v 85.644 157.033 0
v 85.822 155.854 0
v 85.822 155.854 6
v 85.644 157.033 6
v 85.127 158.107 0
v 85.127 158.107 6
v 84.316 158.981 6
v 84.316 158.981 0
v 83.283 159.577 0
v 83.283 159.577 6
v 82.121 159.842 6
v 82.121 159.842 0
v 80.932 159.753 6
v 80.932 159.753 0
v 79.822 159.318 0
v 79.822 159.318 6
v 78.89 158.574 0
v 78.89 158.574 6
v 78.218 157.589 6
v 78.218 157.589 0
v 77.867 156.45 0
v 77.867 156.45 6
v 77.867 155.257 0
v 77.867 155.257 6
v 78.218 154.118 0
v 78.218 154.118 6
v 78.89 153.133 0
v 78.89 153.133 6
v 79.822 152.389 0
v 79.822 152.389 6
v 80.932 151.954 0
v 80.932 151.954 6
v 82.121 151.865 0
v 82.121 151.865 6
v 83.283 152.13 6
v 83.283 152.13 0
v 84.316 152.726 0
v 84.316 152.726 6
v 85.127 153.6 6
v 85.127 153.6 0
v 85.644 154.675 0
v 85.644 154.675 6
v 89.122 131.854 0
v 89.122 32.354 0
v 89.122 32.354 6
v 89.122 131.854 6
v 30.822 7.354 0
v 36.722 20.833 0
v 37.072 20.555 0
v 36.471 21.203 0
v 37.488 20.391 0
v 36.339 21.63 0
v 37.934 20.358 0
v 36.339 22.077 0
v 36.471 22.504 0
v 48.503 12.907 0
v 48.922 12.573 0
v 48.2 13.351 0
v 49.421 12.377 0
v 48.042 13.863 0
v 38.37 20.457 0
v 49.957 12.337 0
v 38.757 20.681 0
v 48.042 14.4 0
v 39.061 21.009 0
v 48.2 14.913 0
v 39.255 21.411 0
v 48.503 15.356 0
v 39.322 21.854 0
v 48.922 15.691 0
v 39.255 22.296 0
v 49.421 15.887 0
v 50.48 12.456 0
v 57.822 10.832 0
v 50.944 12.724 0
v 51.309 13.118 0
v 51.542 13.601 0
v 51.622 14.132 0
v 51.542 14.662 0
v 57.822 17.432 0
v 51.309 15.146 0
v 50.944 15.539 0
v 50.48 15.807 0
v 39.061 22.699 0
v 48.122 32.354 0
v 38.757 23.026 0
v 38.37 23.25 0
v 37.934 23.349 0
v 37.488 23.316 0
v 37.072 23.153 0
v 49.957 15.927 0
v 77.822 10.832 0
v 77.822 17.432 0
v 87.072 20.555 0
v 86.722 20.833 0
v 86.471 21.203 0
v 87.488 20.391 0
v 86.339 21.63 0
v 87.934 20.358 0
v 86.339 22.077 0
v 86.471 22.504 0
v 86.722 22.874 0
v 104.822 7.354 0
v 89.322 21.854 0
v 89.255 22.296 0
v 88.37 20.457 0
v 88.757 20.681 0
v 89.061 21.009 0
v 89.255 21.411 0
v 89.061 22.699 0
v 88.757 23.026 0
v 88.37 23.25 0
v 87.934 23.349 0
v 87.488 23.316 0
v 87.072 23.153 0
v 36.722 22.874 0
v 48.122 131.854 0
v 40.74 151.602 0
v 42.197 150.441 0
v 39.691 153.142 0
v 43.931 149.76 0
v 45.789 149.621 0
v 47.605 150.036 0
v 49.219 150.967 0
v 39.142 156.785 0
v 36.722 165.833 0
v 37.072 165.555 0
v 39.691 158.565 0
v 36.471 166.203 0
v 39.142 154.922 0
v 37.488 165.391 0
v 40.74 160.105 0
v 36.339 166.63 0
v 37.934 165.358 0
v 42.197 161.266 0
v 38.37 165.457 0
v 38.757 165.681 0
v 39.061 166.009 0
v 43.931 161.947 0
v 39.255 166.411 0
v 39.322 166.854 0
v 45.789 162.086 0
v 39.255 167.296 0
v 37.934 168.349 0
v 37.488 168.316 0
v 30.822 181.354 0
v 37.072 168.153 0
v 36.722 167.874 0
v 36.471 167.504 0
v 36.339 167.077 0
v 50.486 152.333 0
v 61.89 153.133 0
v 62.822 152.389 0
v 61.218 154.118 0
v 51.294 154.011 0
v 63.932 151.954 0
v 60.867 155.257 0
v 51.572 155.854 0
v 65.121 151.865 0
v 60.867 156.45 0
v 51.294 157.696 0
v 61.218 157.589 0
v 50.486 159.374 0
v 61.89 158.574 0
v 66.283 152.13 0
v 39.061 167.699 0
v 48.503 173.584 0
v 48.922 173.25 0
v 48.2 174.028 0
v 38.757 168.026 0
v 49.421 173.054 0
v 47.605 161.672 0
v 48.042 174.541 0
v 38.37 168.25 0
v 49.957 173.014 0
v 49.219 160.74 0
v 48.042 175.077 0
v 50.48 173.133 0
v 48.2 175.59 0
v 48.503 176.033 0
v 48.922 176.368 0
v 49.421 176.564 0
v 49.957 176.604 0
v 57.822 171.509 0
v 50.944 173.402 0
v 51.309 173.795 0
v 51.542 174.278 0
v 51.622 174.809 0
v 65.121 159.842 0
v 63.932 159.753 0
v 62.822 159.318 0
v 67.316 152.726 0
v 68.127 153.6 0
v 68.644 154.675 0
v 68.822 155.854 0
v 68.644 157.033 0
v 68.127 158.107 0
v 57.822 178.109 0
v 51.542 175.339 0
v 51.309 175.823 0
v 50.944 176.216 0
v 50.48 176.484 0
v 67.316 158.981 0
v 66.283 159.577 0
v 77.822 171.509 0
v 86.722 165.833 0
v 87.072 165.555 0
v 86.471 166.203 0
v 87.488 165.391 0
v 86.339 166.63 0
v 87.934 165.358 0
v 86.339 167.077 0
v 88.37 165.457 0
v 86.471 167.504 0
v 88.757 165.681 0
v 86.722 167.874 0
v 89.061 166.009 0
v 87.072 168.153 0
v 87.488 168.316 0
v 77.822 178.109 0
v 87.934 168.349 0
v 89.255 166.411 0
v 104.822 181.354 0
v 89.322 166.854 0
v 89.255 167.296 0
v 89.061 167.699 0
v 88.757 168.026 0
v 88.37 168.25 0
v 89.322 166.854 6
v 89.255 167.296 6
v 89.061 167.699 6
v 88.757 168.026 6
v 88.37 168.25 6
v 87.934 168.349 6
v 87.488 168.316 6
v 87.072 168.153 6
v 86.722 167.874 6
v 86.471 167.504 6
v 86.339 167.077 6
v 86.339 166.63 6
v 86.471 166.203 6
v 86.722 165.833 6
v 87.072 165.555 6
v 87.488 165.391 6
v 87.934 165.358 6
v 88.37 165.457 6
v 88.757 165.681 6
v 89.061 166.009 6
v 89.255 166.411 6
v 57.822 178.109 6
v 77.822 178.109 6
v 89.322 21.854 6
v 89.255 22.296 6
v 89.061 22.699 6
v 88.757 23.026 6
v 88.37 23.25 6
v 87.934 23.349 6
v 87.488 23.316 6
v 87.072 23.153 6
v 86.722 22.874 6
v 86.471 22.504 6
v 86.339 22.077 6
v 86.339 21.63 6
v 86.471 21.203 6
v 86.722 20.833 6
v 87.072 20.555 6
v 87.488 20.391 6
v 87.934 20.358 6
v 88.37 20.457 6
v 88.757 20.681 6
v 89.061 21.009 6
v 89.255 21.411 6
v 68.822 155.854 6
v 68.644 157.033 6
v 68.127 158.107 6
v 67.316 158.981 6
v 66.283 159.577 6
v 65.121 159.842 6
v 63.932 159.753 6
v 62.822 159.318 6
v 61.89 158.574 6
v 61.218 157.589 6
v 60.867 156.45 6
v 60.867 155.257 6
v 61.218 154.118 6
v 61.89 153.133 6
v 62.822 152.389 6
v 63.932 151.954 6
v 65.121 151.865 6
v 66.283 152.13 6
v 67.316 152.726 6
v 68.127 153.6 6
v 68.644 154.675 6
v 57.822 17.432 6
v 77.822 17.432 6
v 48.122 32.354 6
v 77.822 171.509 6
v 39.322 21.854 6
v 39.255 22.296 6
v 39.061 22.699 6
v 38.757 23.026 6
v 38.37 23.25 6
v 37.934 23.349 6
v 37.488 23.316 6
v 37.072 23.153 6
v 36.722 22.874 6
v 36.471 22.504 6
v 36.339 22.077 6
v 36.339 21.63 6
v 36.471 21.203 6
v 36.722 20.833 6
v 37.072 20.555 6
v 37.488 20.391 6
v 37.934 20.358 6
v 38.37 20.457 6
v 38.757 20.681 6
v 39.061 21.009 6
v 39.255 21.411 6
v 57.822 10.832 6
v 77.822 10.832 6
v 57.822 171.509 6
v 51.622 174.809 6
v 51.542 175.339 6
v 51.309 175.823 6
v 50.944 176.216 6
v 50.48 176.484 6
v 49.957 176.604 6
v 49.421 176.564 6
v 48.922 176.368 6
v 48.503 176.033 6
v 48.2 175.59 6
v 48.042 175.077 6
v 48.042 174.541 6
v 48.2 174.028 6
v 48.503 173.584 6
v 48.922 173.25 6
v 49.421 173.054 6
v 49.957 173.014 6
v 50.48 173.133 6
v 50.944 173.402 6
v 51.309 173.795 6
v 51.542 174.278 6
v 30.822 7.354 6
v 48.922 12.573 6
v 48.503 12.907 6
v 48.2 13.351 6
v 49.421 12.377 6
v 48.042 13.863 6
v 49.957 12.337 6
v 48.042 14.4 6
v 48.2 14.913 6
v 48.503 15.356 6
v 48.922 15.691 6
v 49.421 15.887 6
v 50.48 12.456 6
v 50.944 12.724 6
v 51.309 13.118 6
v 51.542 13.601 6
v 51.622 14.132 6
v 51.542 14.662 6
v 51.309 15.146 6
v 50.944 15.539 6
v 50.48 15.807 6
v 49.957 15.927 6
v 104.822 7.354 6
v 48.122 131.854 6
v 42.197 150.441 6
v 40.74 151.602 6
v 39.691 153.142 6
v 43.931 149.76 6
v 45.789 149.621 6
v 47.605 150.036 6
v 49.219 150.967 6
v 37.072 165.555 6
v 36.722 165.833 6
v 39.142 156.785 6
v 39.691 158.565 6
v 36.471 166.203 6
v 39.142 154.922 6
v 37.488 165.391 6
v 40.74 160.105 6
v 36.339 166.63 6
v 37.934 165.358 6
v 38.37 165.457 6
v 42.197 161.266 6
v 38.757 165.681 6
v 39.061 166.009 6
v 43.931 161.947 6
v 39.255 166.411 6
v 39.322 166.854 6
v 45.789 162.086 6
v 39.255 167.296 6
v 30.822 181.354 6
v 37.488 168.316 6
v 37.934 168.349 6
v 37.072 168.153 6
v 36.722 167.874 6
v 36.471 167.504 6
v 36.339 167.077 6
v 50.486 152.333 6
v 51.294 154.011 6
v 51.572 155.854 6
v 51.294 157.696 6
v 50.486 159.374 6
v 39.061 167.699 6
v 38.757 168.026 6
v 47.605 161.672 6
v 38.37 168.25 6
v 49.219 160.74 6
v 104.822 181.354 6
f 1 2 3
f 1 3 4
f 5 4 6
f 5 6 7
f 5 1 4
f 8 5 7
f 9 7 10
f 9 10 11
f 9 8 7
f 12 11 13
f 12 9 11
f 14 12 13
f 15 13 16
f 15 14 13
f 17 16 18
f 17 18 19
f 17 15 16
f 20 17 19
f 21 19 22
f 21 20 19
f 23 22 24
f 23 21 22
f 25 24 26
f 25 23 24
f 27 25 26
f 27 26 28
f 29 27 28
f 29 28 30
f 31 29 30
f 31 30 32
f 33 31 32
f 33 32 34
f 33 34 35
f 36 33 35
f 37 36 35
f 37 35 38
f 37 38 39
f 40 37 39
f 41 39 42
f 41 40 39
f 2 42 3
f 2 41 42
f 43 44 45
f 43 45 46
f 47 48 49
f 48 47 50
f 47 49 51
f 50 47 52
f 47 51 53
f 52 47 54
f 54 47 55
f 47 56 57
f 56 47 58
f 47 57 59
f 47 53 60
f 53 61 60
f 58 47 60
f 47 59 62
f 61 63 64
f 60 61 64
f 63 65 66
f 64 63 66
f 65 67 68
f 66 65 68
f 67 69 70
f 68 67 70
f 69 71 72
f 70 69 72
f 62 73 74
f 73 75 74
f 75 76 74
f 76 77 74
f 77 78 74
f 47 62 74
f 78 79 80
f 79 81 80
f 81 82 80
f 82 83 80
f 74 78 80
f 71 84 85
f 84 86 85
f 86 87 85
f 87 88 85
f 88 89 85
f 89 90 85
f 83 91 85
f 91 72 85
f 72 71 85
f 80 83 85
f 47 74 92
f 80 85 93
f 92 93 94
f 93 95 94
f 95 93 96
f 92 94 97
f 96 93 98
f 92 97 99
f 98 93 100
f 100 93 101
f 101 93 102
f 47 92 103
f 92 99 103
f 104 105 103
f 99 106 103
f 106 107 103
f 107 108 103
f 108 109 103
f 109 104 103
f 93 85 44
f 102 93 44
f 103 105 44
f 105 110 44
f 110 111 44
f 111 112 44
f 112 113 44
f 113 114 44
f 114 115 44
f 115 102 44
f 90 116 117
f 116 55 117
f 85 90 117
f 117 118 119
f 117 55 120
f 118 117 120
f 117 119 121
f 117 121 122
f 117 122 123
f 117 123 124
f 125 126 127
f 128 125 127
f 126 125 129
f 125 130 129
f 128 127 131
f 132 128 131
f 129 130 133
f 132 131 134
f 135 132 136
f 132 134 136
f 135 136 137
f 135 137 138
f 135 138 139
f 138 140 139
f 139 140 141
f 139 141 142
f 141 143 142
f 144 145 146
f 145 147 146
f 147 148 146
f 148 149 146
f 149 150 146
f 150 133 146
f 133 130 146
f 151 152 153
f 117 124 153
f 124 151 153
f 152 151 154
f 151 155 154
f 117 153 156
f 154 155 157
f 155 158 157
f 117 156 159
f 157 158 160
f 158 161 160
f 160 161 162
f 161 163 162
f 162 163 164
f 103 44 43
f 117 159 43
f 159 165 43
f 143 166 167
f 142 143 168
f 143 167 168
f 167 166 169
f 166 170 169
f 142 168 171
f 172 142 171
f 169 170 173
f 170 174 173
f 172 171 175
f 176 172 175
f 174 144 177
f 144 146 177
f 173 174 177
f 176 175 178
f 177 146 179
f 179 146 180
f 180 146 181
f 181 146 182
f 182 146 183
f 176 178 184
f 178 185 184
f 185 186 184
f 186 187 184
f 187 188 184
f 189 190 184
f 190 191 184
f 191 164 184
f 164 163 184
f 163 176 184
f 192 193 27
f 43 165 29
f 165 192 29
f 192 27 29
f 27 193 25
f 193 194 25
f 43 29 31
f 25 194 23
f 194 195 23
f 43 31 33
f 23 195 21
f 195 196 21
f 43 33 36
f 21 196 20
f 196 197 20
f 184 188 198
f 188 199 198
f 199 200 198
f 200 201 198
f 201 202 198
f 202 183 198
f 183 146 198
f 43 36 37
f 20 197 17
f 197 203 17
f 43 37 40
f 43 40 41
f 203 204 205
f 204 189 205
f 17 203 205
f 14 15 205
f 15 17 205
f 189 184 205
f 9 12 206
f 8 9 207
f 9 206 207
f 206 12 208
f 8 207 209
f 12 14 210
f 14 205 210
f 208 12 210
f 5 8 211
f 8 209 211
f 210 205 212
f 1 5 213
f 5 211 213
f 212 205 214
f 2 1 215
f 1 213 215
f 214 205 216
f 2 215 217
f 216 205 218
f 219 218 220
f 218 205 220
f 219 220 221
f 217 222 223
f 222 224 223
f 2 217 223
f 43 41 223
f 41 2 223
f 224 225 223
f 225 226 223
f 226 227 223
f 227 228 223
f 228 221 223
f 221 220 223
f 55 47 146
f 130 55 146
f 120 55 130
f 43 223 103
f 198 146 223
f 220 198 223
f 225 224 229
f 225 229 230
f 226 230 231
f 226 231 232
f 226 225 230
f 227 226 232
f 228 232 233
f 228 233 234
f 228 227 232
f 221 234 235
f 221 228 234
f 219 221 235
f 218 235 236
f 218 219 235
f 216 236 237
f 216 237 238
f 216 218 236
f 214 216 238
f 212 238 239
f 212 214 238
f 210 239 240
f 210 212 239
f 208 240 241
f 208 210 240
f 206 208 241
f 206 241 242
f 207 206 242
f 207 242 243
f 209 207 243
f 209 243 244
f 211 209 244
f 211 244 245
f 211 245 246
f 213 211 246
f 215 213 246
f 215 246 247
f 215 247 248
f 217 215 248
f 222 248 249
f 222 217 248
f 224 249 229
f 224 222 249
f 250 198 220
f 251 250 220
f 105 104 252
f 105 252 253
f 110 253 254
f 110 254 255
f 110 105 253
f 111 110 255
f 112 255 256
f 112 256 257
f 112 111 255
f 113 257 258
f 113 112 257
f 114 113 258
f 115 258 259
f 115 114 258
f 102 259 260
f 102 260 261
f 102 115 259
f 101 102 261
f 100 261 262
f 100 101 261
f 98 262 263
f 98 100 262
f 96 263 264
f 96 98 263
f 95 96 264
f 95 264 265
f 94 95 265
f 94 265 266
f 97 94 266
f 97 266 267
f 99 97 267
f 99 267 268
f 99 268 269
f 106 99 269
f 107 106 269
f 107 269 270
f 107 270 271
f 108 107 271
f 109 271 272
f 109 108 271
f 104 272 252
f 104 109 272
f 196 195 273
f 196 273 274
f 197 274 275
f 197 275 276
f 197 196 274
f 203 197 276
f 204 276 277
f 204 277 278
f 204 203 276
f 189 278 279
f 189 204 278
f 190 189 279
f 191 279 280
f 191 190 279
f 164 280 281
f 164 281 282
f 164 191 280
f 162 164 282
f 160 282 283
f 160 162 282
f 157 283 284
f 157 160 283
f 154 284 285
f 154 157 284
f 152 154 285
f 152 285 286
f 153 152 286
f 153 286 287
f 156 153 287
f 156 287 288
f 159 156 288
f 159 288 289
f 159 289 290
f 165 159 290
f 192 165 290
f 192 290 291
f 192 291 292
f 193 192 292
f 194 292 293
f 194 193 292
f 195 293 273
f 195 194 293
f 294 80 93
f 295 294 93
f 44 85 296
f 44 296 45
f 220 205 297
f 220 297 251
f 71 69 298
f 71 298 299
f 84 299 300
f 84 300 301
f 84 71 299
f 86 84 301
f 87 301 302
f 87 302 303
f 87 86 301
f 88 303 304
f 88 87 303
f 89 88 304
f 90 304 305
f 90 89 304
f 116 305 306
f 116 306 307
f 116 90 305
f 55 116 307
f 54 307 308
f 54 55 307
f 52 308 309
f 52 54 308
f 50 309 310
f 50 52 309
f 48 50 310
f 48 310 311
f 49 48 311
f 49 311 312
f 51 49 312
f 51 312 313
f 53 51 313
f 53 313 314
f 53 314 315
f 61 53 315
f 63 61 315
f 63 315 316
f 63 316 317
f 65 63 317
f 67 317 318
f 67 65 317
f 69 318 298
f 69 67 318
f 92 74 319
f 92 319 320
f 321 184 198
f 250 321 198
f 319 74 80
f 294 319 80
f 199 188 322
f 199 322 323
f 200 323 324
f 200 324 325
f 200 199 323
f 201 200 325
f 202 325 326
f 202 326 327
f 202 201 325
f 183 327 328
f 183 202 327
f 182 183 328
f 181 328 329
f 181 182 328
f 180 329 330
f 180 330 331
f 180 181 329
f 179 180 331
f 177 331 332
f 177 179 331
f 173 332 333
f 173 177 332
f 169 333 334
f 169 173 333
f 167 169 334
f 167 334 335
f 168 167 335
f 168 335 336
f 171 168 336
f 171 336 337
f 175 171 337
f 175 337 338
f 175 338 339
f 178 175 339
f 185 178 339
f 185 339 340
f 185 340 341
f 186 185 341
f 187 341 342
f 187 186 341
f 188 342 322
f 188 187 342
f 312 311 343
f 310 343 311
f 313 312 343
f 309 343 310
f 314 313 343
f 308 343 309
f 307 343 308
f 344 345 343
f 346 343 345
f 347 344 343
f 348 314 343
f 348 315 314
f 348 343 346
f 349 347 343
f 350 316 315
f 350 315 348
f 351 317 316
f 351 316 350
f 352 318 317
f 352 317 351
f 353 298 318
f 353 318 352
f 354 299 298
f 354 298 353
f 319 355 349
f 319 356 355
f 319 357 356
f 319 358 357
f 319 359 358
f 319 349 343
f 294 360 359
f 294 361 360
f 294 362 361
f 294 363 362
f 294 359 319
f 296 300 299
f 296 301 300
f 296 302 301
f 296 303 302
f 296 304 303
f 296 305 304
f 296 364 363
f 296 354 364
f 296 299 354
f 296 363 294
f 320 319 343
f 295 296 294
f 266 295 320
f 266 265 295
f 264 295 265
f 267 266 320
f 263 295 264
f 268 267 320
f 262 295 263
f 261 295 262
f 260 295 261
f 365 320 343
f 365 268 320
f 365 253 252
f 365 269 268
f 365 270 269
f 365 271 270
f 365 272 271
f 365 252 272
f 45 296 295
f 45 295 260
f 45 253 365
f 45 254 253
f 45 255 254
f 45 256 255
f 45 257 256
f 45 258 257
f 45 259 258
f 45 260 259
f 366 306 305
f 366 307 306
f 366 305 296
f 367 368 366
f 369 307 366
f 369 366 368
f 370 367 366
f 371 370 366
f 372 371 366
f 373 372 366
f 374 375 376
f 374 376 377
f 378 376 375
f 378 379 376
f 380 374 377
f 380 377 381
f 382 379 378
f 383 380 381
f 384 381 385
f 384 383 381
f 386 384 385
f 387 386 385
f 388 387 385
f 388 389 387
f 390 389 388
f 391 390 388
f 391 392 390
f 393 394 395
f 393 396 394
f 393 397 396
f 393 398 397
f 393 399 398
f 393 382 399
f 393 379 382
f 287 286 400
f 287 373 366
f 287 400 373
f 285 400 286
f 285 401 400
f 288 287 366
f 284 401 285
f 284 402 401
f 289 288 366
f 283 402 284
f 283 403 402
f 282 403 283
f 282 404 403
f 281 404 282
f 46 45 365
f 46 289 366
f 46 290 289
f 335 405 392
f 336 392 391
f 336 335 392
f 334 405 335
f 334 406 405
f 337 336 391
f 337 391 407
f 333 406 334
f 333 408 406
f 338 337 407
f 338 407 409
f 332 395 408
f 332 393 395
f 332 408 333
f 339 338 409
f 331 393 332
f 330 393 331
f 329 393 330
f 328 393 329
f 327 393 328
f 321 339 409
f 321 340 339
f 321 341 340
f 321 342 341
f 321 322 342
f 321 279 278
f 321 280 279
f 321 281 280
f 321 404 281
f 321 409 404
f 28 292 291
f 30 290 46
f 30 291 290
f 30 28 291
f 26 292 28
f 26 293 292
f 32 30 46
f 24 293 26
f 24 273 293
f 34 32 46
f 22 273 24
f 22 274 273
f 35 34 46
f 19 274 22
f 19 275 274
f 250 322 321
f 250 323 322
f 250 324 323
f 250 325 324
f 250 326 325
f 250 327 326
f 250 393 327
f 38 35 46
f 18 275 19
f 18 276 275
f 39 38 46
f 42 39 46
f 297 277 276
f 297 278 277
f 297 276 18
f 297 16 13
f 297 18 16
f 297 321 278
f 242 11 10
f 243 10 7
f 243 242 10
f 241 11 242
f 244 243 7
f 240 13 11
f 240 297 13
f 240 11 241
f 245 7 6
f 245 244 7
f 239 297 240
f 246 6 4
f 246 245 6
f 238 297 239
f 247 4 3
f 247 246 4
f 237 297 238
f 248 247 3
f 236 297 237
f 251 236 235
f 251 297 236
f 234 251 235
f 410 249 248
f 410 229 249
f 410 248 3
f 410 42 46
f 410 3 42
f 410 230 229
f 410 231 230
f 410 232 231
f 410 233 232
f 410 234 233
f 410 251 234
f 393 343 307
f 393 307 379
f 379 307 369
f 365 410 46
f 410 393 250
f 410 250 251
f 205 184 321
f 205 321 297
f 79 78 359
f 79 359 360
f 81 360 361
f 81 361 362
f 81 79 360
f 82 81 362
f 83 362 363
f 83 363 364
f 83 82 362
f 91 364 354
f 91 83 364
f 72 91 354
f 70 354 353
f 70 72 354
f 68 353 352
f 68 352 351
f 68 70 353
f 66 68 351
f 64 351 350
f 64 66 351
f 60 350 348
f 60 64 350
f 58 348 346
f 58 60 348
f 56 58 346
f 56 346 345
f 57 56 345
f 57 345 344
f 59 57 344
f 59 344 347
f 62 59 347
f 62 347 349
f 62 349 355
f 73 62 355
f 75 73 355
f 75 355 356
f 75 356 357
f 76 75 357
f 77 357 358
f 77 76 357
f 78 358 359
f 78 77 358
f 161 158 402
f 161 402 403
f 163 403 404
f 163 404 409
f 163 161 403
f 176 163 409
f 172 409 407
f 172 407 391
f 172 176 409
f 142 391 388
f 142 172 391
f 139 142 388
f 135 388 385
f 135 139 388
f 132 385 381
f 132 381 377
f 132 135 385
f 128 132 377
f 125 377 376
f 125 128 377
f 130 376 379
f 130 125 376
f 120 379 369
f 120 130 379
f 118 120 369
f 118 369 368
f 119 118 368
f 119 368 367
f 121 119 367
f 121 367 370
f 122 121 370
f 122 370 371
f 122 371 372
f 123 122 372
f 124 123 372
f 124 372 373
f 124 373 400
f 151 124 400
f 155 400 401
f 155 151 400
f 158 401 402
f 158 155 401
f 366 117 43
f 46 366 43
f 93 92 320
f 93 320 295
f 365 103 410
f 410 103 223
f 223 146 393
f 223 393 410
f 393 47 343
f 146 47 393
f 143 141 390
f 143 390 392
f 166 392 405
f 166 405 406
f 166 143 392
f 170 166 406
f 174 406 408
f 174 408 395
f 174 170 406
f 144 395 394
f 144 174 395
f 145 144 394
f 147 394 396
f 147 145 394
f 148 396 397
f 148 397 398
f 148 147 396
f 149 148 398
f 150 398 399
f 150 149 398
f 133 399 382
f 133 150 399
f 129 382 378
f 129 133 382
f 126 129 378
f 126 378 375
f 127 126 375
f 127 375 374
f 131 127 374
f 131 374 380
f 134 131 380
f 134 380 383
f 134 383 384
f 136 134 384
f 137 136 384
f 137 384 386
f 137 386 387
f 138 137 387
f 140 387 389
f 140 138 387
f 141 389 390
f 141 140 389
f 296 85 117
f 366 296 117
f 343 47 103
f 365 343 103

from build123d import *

# Parameters (mm, degrees)
MODEL_W                  = 73.99999408
MODEL_H                  = 173.99998608
MODEL_R                  = 1.5
MODEL_R_2                = 1.799999856
MODEL_R_3                = 1.49999988
MODEL_R_4                = 3.99999968
MODEL_R_5                = 6.2499995
MODEL_W_2                = 40.99999672
MODEL_H_2                = 99.49999204
MODEL_W_3                = 19.999994237
MODEL_H_3                = 6.600001389
RESSALTO_EXTRUS_O1_DEPTH = 6


with BuildPart() as part:
    # Model → Ressalto-extrusão1 (new body)
    with BuildSketch(Plane.XY):
        with Locations((67.822014365, 94.353551358)):
            Rectangle(MODEL_W, MODEL_H)
        with Locations((87.822012765, 21.853557158)):
            Circle(MODEL_R, mode=Mode.SUBTRACT)
        with Locations((49.822015805, 14.131755092)):
            Circle(MODEL_R_2, mode=Mode.SUBTRACT)
        with Locations((37.822016765, 21.853557158)):
            Circle(MODEL_R_3, mode=Mode.SUBTRACT)
        with Locations((87.822012765, 166.853545558)):
            Circle(MODEL_R_3, mode=Mode.SUBTRACT)
        with Locations((81.822013245, 155.853546358)):
            Circle(MODEL_R_4, mode=Mode.SUBTRACT)
        with Locations((64.822014605, 155.853546358)):
            Circle(MODEL_R_4, mode=Mode.SUBTRACT)
        with Locations((45.322016165, 155.853546358)):
            Circle(MODEL_R_5, mode=Mode.SUBTRACT)
        with Locations((37.822016765, 166.853545558)):
            Circle(MODEL_R_3, mode=Mode.SUBTRACT)
        with Locations((49.822015805, 174.808809717)):
            Circle(MODEL_R_2, mode=Mode.SUBTRACT)
        with Locations((68.622014301, 82.103552338)):
            Rectangle(MODEL_W_2, MODEL_H_2, mode=Mode.SUBTRACT)
        with Locations((67.822014365, 14.131755092)):
            Rectangle(MODEL_W_3, MODEL_H_3, mode=Mode.SUBTRACT)
        with Locations((67.822014365, 174.808809717)):
            Rectangle(MODEL_W_3, MODEL_H_3, mode=Mode.SUBTRACT)
    extrude(amount=RESSALTO_EXTRUS_O1_DEPTH)


solid = part.part
